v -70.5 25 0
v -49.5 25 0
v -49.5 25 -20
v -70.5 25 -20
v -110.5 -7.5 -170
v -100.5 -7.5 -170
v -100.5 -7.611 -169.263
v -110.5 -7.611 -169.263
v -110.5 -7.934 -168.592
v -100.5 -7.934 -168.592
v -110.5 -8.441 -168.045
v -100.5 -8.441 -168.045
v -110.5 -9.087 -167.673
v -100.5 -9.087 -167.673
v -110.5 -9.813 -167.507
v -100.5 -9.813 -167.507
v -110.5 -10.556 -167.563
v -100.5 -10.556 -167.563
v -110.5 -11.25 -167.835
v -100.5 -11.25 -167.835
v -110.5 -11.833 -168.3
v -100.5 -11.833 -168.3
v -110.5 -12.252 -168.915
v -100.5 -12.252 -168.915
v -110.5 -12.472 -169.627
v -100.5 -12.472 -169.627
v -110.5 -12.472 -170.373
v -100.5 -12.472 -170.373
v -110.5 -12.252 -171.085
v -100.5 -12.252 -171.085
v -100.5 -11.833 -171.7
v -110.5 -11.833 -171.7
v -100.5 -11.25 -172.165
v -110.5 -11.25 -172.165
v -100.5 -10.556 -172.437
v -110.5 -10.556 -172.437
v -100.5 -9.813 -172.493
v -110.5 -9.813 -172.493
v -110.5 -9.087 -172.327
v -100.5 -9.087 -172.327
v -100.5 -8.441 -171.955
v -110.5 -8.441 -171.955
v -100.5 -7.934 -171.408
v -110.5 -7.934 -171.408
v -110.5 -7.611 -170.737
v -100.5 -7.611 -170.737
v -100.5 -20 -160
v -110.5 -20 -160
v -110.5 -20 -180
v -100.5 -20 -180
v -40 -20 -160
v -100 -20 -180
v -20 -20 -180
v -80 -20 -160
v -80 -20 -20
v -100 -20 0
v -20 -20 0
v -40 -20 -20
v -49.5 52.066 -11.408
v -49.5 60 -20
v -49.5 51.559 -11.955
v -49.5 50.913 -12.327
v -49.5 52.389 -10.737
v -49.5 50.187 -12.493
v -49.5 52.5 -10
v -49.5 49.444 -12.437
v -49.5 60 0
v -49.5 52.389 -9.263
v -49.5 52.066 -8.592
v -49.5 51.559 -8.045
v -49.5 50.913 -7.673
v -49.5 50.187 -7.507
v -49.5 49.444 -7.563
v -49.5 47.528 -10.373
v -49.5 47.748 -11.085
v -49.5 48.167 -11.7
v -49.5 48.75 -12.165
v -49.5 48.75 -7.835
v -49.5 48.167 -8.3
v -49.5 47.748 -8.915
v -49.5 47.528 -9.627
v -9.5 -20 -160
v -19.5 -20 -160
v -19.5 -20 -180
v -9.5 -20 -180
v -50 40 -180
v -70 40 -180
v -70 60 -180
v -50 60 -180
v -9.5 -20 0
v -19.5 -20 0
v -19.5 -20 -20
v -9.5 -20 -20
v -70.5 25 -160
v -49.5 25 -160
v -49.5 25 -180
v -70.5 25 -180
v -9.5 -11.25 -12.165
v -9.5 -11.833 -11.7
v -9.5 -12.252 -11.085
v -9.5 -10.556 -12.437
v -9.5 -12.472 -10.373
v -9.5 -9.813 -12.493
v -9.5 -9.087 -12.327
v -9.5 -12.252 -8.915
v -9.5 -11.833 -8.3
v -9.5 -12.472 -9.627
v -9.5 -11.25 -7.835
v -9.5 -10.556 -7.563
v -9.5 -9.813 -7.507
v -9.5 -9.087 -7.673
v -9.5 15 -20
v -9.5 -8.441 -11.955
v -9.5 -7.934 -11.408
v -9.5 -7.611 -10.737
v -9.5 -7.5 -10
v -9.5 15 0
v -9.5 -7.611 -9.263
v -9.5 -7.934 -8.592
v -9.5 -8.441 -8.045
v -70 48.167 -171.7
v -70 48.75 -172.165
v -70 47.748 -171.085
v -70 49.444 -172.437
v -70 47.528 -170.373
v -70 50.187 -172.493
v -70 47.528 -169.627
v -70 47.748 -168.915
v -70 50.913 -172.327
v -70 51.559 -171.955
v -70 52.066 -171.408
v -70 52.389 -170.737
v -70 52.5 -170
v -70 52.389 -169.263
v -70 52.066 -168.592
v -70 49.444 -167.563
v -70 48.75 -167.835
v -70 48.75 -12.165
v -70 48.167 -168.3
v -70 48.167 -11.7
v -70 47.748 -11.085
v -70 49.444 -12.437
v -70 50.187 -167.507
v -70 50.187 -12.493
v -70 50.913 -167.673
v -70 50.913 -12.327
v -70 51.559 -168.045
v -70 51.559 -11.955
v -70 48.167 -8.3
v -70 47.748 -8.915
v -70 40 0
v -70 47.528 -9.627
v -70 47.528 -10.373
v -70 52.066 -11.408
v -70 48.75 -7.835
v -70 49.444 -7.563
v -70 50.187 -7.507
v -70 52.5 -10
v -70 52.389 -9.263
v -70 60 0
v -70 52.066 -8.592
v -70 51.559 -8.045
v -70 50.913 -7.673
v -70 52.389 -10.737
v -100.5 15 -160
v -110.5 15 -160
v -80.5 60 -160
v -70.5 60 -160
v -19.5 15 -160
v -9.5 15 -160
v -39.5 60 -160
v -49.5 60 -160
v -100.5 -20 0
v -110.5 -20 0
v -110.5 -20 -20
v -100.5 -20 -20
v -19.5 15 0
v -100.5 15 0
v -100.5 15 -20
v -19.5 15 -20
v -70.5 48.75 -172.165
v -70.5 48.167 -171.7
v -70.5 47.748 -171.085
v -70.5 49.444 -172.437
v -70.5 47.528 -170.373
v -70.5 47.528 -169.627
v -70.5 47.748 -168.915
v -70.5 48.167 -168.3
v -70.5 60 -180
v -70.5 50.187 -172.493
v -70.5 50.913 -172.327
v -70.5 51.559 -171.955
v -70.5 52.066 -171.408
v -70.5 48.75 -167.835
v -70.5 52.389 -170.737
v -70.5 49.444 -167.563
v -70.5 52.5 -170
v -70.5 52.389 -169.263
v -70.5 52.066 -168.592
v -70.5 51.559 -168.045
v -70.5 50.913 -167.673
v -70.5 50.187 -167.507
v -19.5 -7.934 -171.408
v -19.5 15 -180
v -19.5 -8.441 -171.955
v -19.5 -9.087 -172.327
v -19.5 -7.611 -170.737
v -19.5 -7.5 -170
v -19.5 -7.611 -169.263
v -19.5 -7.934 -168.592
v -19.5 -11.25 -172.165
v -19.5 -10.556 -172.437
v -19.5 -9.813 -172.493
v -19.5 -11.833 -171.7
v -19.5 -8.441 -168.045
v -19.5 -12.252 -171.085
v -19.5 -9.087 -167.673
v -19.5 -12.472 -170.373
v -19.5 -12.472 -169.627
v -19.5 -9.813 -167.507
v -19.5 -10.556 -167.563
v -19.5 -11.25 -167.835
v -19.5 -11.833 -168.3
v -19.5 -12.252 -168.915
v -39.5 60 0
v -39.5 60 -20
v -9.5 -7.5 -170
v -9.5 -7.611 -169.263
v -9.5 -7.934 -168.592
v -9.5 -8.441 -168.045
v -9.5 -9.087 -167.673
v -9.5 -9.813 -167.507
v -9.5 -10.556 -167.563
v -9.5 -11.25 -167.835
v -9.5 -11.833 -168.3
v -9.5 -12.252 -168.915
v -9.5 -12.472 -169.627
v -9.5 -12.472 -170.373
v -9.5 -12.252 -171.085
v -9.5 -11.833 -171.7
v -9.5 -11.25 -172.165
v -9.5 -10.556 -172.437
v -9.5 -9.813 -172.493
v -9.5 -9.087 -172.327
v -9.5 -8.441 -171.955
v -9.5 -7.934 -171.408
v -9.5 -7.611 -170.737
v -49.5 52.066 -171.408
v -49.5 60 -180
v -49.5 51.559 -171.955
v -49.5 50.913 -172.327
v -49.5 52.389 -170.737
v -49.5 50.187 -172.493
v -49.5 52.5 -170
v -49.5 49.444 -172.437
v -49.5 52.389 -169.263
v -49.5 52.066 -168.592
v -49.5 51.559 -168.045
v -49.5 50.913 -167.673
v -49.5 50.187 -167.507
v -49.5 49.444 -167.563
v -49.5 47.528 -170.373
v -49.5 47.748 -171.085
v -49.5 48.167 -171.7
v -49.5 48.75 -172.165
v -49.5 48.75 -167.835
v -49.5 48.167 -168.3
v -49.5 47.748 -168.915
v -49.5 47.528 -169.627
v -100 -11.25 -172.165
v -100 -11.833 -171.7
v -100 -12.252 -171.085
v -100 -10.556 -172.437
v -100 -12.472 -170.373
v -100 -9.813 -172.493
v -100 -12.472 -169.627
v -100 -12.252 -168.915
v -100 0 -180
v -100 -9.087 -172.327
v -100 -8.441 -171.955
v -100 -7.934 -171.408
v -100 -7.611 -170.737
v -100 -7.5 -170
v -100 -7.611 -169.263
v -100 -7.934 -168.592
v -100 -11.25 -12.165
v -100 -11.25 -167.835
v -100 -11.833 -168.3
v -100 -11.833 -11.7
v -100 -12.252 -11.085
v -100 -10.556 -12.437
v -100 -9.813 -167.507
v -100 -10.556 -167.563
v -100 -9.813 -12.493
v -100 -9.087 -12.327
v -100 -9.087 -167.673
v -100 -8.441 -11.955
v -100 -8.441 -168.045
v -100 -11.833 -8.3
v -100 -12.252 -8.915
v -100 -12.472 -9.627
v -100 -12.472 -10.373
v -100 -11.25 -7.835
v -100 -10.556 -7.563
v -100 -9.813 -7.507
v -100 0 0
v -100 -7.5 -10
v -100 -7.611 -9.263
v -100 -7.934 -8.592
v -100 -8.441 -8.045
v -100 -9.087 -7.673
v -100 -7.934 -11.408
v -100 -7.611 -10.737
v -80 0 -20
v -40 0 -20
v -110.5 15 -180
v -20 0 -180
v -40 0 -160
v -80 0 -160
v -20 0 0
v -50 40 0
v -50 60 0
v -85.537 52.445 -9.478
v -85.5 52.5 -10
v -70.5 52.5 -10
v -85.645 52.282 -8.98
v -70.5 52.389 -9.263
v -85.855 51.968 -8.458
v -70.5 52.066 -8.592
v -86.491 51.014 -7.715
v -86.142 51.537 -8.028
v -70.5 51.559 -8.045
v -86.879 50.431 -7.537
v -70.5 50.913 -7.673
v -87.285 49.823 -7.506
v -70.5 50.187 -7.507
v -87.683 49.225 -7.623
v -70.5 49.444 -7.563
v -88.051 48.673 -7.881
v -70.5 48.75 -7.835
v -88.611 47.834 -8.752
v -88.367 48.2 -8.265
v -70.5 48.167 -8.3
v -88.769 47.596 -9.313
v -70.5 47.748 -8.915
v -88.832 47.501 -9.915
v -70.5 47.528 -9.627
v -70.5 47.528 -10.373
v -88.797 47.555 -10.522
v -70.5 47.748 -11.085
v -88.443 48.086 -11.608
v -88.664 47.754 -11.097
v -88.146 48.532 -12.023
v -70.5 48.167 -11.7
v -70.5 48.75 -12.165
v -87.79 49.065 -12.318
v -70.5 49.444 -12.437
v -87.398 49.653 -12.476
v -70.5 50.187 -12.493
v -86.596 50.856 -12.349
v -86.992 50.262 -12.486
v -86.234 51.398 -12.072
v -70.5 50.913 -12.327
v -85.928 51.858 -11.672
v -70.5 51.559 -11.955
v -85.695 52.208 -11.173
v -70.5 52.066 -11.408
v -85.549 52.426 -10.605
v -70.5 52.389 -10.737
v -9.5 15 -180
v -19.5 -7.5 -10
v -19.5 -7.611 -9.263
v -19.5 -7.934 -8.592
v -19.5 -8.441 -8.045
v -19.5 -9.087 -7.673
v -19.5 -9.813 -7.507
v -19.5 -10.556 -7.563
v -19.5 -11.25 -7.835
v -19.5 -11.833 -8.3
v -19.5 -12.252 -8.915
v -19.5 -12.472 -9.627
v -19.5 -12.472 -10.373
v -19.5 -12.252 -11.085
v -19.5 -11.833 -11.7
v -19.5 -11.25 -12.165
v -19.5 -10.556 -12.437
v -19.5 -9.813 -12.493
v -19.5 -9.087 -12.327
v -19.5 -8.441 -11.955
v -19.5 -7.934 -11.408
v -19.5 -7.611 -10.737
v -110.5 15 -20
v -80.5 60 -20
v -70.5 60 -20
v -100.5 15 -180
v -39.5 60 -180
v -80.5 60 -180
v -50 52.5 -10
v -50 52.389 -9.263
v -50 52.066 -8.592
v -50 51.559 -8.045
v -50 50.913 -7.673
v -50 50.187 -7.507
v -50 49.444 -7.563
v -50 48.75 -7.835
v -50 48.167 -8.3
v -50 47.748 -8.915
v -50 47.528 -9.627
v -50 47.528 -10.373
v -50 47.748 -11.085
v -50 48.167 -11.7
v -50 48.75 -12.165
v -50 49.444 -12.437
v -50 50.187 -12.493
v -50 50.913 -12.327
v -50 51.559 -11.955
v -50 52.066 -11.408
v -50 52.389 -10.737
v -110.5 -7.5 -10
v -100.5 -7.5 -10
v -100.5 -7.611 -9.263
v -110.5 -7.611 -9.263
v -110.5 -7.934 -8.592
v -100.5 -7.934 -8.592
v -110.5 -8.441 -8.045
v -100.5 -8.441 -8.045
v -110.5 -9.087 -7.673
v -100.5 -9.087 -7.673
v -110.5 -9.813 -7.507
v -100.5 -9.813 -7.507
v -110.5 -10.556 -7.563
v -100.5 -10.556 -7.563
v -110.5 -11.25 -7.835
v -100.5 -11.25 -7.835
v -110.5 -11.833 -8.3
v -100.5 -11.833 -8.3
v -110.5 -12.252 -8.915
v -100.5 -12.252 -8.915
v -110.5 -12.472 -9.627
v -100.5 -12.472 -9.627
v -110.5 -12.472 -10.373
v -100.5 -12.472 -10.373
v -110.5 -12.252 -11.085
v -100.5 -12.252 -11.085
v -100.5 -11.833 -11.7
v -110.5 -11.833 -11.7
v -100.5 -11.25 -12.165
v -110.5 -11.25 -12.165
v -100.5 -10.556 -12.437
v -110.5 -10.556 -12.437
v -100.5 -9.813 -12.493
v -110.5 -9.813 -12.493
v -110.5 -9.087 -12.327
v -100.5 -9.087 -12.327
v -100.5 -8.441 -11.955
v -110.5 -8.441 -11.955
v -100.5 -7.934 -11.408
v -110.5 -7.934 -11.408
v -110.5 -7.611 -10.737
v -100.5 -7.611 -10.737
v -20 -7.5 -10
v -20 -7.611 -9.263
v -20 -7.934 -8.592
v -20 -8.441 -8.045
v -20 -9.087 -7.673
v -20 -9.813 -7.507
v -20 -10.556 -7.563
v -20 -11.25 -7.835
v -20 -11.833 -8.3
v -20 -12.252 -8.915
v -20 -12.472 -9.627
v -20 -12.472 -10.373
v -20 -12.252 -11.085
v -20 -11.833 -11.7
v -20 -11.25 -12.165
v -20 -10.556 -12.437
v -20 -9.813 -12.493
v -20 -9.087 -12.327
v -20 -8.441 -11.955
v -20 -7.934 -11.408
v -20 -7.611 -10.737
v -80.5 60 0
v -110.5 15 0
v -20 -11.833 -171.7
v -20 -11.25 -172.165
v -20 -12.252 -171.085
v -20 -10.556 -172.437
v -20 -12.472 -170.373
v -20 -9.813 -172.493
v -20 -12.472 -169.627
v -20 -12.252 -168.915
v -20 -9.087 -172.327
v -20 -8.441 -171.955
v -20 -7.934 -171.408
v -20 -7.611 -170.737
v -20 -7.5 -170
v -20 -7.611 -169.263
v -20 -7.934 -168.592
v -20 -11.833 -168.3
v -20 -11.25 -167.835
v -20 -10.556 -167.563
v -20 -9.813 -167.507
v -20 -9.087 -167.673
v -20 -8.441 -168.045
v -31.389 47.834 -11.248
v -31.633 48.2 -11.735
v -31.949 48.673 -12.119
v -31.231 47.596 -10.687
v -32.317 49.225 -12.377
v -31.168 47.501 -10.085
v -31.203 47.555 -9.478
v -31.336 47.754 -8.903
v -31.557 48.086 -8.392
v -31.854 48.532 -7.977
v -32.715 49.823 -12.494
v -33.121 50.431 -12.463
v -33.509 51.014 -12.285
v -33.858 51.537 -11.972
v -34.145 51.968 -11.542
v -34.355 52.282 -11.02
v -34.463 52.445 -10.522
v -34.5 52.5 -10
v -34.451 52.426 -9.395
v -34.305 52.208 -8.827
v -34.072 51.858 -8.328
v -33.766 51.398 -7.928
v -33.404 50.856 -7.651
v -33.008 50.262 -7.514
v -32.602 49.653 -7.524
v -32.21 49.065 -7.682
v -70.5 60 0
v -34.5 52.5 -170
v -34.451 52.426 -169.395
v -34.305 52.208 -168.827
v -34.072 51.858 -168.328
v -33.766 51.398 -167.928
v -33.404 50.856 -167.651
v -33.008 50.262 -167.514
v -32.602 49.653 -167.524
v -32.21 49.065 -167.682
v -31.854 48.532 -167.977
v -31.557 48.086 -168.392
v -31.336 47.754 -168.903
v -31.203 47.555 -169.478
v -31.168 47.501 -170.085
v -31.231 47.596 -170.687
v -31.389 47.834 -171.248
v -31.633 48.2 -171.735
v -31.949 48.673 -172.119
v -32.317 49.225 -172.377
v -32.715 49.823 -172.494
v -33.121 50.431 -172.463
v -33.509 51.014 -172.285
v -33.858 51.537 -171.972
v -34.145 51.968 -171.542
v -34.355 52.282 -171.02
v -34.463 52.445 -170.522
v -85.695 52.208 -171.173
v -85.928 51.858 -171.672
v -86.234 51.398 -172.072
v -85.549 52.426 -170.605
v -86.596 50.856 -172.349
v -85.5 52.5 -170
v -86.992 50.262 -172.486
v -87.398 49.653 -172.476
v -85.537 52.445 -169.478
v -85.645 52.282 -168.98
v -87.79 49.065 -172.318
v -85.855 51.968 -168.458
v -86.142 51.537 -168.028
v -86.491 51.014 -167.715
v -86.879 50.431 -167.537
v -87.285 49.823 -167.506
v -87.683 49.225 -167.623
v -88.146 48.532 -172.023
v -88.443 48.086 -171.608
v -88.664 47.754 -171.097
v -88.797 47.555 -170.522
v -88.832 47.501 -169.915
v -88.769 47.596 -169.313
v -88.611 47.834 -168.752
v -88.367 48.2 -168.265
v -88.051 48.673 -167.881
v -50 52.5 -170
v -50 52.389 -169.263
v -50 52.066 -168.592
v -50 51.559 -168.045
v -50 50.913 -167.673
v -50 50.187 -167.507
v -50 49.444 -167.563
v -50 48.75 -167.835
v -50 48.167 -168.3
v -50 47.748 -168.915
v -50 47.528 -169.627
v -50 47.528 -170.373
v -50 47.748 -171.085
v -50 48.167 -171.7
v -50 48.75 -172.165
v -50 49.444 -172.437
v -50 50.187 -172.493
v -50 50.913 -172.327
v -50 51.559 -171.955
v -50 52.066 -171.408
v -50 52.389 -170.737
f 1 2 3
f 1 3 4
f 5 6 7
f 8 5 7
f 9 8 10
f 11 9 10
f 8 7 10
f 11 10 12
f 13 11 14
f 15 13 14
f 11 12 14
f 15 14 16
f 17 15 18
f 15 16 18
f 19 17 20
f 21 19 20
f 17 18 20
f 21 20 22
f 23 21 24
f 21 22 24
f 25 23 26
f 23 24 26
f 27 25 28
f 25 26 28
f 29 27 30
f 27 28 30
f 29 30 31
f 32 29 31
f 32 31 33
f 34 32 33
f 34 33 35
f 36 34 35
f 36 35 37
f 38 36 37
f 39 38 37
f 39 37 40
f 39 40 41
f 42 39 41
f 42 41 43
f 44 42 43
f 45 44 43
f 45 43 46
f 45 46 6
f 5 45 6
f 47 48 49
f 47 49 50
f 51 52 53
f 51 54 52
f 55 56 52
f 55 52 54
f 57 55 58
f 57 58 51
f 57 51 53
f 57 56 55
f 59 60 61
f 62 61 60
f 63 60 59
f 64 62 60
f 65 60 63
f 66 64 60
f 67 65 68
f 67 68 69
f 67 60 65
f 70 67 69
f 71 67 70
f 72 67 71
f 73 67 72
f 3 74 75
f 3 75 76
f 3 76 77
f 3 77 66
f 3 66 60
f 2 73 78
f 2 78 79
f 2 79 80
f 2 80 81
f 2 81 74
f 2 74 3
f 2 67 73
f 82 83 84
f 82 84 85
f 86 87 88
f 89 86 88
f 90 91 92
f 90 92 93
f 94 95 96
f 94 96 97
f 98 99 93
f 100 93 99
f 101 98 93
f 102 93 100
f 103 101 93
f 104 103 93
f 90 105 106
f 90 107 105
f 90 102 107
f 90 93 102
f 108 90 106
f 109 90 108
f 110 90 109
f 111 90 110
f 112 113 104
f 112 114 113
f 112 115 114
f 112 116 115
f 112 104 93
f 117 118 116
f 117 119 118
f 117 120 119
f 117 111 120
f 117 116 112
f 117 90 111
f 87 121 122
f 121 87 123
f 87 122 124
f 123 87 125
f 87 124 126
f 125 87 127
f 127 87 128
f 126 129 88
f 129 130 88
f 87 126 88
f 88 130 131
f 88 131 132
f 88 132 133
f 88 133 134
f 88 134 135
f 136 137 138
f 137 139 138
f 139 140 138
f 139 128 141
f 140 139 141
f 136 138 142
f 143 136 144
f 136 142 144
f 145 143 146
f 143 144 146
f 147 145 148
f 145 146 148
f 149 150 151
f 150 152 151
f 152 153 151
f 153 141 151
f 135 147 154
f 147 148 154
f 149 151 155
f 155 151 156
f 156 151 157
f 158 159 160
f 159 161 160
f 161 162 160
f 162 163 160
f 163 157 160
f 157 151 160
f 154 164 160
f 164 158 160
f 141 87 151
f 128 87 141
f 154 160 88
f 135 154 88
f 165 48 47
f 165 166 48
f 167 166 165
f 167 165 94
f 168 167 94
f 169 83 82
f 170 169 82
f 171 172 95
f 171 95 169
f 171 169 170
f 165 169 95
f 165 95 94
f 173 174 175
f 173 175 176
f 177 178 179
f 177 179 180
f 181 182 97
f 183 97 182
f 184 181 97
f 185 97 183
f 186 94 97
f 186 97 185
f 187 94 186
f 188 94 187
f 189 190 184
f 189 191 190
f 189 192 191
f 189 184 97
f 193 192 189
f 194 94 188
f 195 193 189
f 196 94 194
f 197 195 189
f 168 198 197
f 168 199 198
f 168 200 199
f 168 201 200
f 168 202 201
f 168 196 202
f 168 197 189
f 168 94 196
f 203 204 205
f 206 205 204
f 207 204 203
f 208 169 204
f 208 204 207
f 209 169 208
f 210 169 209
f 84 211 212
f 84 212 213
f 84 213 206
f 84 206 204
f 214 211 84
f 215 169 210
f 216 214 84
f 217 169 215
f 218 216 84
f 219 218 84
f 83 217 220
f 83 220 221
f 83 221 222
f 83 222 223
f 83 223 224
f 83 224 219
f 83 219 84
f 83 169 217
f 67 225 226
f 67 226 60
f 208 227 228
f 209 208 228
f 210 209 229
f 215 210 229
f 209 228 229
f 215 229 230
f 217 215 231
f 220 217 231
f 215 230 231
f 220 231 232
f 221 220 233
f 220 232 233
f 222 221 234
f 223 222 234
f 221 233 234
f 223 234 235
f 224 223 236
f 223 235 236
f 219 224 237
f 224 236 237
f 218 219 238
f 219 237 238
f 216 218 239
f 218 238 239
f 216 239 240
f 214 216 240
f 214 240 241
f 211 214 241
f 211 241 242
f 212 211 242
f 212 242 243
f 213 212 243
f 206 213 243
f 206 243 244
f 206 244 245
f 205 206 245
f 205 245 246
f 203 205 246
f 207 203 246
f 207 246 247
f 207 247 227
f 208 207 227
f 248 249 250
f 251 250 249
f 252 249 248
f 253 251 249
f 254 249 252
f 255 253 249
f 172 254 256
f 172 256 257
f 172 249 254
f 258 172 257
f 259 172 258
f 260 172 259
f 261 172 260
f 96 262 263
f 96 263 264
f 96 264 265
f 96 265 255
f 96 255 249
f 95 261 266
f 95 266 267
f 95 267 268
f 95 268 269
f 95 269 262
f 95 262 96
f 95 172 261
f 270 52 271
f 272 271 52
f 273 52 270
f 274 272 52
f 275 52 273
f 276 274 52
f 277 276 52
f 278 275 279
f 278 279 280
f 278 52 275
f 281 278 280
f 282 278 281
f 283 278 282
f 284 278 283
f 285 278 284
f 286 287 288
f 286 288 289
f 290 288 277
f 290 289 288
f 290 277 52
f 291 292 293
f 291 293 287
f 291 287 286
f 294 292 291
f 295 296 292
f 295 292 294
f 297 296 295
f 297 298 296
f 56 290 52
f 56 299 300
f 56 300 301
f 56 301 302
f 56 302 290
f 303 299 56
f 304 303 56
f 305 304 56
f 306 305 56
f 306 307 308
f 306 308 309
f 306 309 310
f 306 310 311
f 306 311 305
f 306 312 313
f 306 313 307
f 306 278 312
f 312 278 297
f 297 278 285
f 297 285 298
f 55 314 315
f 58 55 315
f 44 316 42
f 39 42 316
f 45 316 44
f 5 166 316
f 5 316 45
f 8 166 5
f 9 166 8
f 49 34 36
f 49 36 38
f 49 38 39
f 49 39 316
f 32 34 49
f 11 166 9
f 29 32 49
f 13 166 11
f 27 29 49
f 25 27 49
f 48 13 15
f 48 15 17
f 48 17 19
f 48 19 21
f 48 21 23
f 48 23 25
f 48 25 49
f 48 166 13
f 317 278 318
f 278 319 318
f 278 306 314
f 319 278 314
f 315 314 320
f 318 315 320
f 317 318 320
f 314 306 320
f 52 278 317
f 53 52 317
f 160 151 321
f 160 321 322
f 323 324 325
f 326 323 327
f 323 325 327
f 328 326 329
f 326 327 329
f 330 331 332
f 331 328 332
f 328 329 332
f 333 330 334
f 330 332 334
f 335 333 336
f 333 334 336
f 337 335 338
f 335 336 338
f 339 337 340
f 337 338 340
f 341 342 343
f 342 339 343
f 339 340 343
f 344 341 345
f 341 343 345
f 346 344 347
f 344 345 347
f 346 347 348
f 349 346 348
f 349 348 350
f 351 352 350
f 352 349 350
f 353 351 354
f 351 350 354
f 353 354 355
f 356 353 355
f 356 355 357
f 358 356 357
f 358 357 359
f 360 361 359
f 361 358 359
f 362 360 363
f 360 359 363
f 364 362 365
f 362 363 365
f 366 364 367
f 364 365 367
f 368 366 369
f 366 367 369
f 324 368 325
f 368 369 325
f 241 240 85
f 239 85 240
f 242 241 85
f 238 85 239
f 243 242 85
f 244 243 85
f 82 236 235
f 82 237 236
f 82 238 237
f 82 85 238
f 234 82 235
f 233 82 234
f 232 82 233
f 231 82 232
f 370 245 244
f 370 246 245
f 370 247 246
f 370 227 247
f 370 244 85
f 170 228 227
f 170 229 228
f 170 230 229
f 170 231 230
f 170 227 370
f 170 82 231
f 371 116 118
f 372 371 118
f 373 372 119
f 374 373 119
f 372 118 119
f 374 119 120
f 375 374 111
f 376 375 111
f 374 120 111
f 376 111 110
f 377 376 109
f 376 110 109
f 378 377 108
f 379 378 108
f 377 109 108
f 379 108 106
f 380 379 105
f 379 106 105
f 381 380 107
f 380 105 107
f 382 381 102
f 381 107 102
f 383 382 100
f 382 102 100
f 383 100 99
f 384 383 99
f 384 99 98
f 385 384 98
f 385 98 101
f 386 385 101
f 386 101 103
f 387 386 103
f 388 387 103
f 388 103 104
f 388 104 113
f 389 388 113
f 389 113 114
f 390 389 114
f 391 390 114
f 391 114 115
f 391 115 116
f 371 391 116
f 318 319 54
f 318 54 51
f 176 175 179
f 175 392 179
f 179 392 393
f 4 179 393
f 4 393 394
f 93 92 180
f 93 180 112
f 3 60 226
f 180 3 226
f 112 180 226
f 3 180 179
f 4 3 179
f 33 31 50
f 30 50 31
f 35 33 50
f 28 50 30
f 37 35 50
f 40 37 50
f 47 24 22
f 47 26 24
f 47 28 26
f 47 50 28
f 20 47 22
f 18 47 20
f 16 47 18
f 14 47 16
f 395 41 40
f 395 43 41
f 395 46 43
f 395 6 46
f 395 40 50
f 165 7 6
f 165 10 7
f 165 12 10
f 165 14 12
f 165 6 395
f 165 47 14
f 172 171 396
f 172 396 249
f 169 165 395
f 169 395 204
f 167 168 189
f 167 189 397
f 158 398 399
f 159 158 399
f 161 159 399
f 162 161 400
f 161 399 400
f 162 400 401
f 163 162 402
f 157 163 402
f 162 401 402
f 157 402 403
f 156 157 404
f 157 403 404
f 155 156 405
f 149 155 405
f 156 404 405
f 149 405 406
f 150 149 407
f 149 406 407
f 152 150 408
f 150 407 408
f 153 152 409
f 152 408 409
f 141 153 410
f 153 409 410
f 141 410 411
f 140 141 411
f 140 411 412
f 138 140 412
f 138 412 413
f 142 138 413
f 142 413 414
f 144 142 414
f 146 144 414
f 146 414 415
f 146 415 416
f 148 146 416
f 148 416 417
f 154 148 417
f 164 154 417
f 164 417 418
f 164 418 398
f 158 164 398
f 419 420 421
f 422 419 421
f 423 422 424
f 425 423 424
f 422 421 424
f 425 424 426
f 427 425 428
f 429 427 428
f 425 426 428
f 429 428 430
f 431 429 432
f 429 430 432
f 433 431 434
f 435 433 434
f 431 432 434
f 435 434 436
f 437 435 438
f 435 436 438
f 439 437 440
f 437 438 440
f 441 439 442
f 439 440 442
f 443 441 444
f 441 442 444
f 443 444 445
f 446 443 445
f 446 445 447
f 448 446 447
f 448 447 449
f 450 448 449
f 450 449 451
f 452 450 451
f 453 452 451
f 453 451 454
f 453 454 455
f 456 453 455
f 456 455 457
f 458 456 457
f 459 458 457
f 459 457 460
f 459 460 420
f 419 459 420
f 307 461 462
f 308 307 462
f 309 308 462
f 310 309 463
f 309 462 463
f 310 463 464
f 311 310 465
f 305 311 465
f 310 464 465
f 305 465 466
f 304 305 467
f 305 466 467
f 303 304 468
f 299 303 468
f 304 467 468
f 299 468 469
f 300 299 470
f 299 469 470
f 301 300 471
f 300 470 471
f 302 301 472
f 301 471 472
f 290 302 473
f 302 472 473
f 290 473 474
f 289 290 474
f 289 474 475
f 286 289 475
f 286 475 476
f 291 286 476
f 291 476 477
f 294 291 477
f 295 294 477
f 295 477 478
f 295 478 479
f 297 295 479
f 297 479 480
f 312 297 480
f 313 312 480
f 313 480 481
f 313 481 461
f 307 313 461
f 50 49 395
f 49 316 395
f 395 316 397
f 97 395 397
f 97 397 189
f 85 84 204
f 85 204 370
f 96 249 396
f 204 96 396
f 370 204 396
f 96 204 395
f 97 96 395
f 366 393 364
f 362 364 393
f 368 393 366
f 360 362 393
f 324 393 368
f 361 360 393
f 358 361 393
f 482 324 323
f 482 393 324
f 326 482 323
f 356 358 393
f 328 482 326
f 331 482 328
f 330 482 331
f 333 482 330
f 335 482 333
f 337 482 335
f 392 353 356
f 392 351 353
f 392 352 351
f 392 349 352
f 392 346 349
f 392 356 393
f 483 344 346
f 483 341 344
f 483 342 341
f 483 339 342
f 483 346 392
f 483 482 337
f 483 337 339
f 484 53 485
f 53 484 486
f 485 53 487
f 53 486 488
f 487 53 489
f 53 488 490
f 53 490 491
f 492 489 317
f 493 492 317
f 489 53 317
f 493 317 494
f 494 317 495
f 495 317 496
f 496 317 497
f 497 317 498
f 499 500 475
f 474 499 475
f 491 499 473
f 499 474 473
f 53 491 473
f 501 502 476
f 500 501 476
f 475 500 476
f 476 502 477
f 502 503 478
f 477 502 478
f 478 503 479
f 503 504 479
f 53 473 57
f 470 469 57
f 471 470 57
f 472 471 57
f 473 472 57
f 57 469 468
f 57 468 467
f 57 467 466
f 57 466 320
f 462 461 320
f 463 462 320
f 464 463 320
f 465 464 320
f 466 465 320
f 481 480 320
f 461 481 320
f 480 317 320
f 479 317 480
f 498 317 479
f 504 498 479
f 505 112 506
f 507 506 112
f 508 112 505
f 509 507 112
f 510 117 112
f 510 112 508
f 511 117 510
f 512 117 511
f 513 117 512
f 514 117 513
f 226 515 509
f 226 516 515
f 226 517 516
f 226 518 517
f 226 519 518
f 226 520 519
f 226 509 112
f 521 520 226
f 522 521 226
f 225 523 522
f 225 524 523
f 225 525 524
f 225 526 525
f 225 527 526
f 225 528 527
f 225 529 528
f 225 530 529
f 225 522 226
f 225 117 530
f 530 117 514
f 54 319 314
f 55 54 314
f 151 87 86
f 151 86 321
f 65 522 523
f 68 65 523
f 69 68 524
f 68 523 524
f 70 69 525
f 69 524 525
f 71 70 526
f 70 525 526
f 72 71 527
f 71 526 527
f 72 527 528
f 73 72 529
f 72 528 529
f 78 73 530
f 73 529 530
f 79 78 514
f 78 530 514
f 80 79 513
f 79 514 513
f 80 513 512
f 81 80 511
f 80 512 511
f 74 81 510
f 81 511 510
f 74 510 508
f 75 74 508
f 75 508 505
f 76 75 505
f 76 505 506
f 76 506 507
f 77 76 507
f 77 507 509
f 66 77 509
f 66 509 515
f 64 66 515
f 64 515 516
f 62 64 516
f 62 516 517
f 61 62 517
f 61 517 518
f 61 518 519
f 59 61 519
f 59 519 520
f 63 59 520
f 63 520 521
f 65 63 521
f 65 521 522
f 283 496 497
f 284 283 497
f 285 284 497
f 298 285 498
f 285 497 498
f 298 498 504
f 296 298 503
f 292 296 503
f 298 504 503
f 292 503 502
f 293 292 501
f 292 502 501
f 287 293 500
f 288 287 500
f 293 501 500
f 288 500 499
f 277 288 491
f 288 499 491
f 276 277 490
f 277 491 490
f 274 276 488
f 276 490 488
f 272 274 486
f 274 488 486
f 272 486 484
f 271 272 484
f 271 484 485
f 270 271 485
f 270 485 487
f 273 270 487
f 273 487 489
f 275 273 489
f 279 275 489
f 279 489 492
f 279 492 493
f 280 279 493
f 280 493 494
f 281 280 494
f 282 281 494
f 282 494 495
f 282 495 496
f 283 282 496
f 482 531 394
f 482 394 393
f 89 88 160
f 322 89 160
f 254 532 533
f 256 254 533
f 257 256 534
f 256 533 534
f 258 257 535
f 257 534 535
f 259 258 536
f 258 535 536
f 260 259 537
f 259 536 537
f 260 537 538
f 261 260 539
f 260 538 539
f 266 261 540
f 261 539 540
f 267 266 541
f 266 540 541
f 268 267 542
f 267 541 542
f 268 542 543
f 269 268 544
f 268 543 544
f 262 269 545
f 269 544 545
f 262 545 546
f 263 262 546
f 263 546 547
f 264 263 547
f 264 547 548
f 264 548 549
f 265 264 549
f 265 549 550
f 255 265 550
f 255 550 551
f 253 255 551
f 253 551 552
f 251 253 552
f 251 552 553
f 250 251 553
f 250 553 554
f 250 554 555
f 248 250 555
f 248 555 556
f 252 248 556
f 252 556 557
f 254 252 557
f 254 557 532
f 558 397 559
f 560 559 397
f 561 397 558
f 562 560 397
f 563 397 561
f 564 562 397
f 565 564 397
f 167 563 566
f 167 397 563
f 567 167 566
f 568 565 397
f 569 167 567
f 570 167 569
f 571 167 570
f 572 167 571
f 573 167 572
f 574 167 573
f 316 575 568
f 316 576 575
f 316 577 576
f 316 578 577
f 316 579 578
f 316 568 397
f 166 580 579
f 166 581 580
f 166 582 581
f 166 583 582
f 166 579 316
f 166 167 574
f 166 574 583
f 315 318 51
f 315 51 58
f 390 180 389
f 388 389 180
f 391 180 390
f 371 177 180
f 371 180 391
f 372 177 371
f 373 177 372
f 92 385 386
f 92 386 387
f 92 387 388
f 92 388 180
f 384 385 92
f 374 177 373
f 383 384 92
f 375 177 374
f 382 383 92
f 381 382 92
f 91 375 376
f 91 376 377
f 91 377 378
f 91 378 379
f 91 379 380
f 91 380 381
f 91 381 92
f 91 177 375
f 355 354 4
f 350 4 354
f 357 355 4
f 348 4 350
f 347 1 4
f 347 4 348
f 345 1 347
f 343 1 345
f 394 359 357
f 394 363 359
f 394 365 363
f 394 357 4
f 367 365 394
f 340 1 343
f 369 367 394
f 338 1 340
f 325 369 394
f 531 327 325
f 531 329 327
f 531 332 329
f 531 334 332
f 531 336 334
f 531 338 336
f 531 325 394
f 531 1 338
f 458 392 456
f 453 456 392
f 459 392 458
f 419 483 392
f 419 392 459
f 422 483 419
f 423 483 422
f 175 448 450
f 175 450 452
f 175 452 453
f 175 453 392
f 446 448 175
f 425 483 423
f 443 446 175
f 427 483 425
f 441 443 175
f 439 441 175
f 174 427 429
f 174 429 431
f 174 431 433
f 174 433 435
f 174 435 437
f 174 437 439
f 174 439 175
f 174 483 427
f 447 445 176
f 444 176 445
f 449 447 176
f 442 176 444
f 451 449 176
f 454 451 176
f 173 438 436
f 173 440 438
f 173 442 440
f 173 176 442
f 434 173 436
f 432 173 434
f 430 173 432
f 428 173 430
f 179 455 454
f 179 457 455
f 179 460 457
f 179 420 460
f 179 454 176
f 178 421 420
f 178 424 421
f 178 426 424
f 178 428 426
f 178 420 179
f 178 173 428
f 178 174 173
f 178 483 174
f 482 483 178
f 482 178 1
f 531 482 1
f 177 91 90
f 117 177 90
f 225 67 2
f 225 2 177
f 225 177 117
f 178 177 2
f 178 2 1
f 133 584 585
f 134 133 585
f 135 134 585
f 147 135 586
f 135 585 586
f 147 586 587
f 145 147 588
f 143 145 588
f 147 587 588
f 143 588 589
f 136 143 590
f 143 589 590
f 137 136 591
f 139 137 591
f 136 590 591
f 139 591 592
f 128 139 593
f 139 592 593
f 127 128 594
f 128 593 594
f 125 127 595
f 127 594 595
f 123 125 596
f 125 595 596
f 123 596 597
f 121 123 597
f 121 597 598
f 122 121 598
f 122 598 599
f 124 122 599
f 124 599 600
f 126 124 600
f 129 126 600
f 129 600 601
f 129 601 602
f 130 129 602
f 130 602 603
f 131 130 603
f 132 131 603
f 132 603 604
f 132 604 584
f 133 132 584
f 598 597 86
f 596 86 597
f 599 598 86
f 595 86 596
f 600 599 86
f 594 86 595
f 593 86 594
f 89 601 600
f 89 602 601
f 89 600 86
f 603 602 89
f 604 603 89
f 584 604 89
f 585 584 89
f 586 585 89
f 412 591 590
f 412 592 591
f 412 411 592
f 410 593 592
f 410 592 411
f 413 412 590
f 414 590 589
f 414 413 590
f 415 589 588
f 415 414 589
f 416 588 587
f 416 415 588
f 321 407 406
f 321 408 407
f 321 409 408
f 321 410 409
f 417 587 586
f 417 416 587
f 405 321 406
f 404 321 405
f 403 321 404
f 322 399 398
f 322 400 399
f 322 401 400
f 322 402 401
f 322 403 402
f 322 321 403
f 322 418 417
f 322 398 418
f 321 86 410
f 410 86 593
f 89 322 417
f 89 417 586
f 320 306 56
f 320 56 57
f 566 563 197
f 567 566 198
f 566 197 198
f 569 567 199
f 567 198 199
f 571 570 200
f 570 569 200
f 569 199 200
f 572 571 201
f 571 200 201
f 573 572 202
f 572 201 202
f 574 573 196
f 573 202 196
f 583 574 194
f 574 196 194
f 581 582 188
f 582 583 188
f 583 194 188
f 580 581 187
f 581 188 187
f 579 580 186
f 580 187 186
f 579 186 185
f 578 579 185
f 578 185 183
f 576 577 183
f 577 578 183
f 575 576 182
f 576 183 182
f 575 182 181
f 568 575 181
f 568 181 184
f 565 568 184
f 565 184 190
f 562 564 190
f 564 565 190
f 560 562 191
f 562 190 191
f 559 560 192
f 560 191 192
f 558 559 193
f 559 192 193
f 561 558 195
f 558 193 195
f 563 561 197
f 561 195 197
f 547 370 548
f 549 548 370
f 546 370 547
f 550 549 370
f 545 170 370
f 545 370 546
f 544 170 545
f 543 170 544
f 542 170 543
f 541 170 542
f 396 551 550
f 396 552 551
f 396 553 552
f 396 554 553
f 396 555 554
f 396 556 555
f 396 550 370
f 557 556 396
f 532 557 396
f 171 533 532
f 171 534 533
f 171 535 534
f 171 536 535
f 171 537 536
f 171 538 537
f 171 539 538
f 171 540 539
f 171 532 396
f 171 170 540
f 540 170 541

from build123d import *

# Parameters (mm, degrees)
F3_W      = 80
F3_H      = 180
F3_W_2    = 40
F3_H_2    = 140
F4_DEPTH  = 20
F7_DEPTH  = 20
F8_START  = -160
F8_DEPTH  = 20
F11_W     = 20
F11_H     = 180
F12_DEPTH = 20
F9_R      = 2.5
F13_DEPTH = 110.501


with BuildPart() as f4:
    # F3 (on Front) → F4 (new body)
    with BuildSketch(Plane.XZ):
        with Locations((-60, -90)):
            Rectangle(F3_W, F3_H)
        with Locations((-60, -90)):
            Rectangle(F3_W_2, F3_H_2, mode=Mode.SUBTRACT)
    extrude(amount=F4_DEPTH)


with BuildPart() as f7:
    # F6 (on offset) → F7 (new body)
    with BuildSketch(Plane.XY):
        Polygon((-110.5, -20), (-100.5, -20), (-100.5, 15), (-19.5, 15), (-19.5, -20), (-9.5, -20), (-9.5, 15), (-39.5, 60), (-49.5, 60), (-49.5, 25), (-70.5, 25), (-70.5, 60), (-80.5, 60), (-110.5, 15), align=None)
    extrude(amount=-F7_DEPTH)


with BuildPart() as f8:
    # F6 (on offset) → F8 (new body)
    with BuildSketch(Plane.XY.offset(F8_START)):
        Polygon((-110.5, -20), (-100.5, -20), (-100.5, 15), (-19.5, 15), (-19.5, -20), (-9.5, -20), (-9.5, 15), (-39.5, 60), (-49.5, 60), (-49.5, 25), (-70.5, 25), (-70.5, 60), (-80.5, 60), (-110.5, 15), align=None)
    extrude(amount=-F8_DEPTH)


with BuildPart() as f12:
    # F11 (on offset) → F12 (new body)
    with BuildSketch(Plane.YZ.offset(-70)):
        with Locations((50, -90)):
            Rectangle(F11_W, F11_H)
    extrude(amount=F12_DEPTH)


with BuildPart() as f13_tool:
    # F9 (on Right) → F13 (new body, through all)
    with BuildSketch(Plane.YZ):
        with Locations((-10, -10)):
            Circle(F9_R)
        with Locations((-10, -170)):
            Circle(F9_R)
        with Locations((50, -10)):
            Circle(F9_R)
        with Locations((50, -170)):
            Circle(F9_R)
    extrude(amount=-F13_DEPTH)


with BuildPart() as f4_1:
    add(f4.part)

    # F13: cut by f13_tool
    add(f13_tool.part, mode=Mode.SUBTRACT)


with BuildPart() as f7_1:
    add(f7.part)

    # F13: cut by f13_tool
    add(f13_tool.part, mode=Mode.SUBTRACT)


with BuildPart() as f8_1:
    add(f8.part)

    # F13: cut by f13_tool
    add(f13_tool.part, mode=Mode.SUBTRACT)


with BuildPart() as f12_1:
    add(f12.part)

    # F13: cut by f13_tool
    add(f13_tool.part, mode=Mode.SUBTRACT)


solid = Compound([f4_1.part, f7_1.part, f8_1.part, f12_1.part])
